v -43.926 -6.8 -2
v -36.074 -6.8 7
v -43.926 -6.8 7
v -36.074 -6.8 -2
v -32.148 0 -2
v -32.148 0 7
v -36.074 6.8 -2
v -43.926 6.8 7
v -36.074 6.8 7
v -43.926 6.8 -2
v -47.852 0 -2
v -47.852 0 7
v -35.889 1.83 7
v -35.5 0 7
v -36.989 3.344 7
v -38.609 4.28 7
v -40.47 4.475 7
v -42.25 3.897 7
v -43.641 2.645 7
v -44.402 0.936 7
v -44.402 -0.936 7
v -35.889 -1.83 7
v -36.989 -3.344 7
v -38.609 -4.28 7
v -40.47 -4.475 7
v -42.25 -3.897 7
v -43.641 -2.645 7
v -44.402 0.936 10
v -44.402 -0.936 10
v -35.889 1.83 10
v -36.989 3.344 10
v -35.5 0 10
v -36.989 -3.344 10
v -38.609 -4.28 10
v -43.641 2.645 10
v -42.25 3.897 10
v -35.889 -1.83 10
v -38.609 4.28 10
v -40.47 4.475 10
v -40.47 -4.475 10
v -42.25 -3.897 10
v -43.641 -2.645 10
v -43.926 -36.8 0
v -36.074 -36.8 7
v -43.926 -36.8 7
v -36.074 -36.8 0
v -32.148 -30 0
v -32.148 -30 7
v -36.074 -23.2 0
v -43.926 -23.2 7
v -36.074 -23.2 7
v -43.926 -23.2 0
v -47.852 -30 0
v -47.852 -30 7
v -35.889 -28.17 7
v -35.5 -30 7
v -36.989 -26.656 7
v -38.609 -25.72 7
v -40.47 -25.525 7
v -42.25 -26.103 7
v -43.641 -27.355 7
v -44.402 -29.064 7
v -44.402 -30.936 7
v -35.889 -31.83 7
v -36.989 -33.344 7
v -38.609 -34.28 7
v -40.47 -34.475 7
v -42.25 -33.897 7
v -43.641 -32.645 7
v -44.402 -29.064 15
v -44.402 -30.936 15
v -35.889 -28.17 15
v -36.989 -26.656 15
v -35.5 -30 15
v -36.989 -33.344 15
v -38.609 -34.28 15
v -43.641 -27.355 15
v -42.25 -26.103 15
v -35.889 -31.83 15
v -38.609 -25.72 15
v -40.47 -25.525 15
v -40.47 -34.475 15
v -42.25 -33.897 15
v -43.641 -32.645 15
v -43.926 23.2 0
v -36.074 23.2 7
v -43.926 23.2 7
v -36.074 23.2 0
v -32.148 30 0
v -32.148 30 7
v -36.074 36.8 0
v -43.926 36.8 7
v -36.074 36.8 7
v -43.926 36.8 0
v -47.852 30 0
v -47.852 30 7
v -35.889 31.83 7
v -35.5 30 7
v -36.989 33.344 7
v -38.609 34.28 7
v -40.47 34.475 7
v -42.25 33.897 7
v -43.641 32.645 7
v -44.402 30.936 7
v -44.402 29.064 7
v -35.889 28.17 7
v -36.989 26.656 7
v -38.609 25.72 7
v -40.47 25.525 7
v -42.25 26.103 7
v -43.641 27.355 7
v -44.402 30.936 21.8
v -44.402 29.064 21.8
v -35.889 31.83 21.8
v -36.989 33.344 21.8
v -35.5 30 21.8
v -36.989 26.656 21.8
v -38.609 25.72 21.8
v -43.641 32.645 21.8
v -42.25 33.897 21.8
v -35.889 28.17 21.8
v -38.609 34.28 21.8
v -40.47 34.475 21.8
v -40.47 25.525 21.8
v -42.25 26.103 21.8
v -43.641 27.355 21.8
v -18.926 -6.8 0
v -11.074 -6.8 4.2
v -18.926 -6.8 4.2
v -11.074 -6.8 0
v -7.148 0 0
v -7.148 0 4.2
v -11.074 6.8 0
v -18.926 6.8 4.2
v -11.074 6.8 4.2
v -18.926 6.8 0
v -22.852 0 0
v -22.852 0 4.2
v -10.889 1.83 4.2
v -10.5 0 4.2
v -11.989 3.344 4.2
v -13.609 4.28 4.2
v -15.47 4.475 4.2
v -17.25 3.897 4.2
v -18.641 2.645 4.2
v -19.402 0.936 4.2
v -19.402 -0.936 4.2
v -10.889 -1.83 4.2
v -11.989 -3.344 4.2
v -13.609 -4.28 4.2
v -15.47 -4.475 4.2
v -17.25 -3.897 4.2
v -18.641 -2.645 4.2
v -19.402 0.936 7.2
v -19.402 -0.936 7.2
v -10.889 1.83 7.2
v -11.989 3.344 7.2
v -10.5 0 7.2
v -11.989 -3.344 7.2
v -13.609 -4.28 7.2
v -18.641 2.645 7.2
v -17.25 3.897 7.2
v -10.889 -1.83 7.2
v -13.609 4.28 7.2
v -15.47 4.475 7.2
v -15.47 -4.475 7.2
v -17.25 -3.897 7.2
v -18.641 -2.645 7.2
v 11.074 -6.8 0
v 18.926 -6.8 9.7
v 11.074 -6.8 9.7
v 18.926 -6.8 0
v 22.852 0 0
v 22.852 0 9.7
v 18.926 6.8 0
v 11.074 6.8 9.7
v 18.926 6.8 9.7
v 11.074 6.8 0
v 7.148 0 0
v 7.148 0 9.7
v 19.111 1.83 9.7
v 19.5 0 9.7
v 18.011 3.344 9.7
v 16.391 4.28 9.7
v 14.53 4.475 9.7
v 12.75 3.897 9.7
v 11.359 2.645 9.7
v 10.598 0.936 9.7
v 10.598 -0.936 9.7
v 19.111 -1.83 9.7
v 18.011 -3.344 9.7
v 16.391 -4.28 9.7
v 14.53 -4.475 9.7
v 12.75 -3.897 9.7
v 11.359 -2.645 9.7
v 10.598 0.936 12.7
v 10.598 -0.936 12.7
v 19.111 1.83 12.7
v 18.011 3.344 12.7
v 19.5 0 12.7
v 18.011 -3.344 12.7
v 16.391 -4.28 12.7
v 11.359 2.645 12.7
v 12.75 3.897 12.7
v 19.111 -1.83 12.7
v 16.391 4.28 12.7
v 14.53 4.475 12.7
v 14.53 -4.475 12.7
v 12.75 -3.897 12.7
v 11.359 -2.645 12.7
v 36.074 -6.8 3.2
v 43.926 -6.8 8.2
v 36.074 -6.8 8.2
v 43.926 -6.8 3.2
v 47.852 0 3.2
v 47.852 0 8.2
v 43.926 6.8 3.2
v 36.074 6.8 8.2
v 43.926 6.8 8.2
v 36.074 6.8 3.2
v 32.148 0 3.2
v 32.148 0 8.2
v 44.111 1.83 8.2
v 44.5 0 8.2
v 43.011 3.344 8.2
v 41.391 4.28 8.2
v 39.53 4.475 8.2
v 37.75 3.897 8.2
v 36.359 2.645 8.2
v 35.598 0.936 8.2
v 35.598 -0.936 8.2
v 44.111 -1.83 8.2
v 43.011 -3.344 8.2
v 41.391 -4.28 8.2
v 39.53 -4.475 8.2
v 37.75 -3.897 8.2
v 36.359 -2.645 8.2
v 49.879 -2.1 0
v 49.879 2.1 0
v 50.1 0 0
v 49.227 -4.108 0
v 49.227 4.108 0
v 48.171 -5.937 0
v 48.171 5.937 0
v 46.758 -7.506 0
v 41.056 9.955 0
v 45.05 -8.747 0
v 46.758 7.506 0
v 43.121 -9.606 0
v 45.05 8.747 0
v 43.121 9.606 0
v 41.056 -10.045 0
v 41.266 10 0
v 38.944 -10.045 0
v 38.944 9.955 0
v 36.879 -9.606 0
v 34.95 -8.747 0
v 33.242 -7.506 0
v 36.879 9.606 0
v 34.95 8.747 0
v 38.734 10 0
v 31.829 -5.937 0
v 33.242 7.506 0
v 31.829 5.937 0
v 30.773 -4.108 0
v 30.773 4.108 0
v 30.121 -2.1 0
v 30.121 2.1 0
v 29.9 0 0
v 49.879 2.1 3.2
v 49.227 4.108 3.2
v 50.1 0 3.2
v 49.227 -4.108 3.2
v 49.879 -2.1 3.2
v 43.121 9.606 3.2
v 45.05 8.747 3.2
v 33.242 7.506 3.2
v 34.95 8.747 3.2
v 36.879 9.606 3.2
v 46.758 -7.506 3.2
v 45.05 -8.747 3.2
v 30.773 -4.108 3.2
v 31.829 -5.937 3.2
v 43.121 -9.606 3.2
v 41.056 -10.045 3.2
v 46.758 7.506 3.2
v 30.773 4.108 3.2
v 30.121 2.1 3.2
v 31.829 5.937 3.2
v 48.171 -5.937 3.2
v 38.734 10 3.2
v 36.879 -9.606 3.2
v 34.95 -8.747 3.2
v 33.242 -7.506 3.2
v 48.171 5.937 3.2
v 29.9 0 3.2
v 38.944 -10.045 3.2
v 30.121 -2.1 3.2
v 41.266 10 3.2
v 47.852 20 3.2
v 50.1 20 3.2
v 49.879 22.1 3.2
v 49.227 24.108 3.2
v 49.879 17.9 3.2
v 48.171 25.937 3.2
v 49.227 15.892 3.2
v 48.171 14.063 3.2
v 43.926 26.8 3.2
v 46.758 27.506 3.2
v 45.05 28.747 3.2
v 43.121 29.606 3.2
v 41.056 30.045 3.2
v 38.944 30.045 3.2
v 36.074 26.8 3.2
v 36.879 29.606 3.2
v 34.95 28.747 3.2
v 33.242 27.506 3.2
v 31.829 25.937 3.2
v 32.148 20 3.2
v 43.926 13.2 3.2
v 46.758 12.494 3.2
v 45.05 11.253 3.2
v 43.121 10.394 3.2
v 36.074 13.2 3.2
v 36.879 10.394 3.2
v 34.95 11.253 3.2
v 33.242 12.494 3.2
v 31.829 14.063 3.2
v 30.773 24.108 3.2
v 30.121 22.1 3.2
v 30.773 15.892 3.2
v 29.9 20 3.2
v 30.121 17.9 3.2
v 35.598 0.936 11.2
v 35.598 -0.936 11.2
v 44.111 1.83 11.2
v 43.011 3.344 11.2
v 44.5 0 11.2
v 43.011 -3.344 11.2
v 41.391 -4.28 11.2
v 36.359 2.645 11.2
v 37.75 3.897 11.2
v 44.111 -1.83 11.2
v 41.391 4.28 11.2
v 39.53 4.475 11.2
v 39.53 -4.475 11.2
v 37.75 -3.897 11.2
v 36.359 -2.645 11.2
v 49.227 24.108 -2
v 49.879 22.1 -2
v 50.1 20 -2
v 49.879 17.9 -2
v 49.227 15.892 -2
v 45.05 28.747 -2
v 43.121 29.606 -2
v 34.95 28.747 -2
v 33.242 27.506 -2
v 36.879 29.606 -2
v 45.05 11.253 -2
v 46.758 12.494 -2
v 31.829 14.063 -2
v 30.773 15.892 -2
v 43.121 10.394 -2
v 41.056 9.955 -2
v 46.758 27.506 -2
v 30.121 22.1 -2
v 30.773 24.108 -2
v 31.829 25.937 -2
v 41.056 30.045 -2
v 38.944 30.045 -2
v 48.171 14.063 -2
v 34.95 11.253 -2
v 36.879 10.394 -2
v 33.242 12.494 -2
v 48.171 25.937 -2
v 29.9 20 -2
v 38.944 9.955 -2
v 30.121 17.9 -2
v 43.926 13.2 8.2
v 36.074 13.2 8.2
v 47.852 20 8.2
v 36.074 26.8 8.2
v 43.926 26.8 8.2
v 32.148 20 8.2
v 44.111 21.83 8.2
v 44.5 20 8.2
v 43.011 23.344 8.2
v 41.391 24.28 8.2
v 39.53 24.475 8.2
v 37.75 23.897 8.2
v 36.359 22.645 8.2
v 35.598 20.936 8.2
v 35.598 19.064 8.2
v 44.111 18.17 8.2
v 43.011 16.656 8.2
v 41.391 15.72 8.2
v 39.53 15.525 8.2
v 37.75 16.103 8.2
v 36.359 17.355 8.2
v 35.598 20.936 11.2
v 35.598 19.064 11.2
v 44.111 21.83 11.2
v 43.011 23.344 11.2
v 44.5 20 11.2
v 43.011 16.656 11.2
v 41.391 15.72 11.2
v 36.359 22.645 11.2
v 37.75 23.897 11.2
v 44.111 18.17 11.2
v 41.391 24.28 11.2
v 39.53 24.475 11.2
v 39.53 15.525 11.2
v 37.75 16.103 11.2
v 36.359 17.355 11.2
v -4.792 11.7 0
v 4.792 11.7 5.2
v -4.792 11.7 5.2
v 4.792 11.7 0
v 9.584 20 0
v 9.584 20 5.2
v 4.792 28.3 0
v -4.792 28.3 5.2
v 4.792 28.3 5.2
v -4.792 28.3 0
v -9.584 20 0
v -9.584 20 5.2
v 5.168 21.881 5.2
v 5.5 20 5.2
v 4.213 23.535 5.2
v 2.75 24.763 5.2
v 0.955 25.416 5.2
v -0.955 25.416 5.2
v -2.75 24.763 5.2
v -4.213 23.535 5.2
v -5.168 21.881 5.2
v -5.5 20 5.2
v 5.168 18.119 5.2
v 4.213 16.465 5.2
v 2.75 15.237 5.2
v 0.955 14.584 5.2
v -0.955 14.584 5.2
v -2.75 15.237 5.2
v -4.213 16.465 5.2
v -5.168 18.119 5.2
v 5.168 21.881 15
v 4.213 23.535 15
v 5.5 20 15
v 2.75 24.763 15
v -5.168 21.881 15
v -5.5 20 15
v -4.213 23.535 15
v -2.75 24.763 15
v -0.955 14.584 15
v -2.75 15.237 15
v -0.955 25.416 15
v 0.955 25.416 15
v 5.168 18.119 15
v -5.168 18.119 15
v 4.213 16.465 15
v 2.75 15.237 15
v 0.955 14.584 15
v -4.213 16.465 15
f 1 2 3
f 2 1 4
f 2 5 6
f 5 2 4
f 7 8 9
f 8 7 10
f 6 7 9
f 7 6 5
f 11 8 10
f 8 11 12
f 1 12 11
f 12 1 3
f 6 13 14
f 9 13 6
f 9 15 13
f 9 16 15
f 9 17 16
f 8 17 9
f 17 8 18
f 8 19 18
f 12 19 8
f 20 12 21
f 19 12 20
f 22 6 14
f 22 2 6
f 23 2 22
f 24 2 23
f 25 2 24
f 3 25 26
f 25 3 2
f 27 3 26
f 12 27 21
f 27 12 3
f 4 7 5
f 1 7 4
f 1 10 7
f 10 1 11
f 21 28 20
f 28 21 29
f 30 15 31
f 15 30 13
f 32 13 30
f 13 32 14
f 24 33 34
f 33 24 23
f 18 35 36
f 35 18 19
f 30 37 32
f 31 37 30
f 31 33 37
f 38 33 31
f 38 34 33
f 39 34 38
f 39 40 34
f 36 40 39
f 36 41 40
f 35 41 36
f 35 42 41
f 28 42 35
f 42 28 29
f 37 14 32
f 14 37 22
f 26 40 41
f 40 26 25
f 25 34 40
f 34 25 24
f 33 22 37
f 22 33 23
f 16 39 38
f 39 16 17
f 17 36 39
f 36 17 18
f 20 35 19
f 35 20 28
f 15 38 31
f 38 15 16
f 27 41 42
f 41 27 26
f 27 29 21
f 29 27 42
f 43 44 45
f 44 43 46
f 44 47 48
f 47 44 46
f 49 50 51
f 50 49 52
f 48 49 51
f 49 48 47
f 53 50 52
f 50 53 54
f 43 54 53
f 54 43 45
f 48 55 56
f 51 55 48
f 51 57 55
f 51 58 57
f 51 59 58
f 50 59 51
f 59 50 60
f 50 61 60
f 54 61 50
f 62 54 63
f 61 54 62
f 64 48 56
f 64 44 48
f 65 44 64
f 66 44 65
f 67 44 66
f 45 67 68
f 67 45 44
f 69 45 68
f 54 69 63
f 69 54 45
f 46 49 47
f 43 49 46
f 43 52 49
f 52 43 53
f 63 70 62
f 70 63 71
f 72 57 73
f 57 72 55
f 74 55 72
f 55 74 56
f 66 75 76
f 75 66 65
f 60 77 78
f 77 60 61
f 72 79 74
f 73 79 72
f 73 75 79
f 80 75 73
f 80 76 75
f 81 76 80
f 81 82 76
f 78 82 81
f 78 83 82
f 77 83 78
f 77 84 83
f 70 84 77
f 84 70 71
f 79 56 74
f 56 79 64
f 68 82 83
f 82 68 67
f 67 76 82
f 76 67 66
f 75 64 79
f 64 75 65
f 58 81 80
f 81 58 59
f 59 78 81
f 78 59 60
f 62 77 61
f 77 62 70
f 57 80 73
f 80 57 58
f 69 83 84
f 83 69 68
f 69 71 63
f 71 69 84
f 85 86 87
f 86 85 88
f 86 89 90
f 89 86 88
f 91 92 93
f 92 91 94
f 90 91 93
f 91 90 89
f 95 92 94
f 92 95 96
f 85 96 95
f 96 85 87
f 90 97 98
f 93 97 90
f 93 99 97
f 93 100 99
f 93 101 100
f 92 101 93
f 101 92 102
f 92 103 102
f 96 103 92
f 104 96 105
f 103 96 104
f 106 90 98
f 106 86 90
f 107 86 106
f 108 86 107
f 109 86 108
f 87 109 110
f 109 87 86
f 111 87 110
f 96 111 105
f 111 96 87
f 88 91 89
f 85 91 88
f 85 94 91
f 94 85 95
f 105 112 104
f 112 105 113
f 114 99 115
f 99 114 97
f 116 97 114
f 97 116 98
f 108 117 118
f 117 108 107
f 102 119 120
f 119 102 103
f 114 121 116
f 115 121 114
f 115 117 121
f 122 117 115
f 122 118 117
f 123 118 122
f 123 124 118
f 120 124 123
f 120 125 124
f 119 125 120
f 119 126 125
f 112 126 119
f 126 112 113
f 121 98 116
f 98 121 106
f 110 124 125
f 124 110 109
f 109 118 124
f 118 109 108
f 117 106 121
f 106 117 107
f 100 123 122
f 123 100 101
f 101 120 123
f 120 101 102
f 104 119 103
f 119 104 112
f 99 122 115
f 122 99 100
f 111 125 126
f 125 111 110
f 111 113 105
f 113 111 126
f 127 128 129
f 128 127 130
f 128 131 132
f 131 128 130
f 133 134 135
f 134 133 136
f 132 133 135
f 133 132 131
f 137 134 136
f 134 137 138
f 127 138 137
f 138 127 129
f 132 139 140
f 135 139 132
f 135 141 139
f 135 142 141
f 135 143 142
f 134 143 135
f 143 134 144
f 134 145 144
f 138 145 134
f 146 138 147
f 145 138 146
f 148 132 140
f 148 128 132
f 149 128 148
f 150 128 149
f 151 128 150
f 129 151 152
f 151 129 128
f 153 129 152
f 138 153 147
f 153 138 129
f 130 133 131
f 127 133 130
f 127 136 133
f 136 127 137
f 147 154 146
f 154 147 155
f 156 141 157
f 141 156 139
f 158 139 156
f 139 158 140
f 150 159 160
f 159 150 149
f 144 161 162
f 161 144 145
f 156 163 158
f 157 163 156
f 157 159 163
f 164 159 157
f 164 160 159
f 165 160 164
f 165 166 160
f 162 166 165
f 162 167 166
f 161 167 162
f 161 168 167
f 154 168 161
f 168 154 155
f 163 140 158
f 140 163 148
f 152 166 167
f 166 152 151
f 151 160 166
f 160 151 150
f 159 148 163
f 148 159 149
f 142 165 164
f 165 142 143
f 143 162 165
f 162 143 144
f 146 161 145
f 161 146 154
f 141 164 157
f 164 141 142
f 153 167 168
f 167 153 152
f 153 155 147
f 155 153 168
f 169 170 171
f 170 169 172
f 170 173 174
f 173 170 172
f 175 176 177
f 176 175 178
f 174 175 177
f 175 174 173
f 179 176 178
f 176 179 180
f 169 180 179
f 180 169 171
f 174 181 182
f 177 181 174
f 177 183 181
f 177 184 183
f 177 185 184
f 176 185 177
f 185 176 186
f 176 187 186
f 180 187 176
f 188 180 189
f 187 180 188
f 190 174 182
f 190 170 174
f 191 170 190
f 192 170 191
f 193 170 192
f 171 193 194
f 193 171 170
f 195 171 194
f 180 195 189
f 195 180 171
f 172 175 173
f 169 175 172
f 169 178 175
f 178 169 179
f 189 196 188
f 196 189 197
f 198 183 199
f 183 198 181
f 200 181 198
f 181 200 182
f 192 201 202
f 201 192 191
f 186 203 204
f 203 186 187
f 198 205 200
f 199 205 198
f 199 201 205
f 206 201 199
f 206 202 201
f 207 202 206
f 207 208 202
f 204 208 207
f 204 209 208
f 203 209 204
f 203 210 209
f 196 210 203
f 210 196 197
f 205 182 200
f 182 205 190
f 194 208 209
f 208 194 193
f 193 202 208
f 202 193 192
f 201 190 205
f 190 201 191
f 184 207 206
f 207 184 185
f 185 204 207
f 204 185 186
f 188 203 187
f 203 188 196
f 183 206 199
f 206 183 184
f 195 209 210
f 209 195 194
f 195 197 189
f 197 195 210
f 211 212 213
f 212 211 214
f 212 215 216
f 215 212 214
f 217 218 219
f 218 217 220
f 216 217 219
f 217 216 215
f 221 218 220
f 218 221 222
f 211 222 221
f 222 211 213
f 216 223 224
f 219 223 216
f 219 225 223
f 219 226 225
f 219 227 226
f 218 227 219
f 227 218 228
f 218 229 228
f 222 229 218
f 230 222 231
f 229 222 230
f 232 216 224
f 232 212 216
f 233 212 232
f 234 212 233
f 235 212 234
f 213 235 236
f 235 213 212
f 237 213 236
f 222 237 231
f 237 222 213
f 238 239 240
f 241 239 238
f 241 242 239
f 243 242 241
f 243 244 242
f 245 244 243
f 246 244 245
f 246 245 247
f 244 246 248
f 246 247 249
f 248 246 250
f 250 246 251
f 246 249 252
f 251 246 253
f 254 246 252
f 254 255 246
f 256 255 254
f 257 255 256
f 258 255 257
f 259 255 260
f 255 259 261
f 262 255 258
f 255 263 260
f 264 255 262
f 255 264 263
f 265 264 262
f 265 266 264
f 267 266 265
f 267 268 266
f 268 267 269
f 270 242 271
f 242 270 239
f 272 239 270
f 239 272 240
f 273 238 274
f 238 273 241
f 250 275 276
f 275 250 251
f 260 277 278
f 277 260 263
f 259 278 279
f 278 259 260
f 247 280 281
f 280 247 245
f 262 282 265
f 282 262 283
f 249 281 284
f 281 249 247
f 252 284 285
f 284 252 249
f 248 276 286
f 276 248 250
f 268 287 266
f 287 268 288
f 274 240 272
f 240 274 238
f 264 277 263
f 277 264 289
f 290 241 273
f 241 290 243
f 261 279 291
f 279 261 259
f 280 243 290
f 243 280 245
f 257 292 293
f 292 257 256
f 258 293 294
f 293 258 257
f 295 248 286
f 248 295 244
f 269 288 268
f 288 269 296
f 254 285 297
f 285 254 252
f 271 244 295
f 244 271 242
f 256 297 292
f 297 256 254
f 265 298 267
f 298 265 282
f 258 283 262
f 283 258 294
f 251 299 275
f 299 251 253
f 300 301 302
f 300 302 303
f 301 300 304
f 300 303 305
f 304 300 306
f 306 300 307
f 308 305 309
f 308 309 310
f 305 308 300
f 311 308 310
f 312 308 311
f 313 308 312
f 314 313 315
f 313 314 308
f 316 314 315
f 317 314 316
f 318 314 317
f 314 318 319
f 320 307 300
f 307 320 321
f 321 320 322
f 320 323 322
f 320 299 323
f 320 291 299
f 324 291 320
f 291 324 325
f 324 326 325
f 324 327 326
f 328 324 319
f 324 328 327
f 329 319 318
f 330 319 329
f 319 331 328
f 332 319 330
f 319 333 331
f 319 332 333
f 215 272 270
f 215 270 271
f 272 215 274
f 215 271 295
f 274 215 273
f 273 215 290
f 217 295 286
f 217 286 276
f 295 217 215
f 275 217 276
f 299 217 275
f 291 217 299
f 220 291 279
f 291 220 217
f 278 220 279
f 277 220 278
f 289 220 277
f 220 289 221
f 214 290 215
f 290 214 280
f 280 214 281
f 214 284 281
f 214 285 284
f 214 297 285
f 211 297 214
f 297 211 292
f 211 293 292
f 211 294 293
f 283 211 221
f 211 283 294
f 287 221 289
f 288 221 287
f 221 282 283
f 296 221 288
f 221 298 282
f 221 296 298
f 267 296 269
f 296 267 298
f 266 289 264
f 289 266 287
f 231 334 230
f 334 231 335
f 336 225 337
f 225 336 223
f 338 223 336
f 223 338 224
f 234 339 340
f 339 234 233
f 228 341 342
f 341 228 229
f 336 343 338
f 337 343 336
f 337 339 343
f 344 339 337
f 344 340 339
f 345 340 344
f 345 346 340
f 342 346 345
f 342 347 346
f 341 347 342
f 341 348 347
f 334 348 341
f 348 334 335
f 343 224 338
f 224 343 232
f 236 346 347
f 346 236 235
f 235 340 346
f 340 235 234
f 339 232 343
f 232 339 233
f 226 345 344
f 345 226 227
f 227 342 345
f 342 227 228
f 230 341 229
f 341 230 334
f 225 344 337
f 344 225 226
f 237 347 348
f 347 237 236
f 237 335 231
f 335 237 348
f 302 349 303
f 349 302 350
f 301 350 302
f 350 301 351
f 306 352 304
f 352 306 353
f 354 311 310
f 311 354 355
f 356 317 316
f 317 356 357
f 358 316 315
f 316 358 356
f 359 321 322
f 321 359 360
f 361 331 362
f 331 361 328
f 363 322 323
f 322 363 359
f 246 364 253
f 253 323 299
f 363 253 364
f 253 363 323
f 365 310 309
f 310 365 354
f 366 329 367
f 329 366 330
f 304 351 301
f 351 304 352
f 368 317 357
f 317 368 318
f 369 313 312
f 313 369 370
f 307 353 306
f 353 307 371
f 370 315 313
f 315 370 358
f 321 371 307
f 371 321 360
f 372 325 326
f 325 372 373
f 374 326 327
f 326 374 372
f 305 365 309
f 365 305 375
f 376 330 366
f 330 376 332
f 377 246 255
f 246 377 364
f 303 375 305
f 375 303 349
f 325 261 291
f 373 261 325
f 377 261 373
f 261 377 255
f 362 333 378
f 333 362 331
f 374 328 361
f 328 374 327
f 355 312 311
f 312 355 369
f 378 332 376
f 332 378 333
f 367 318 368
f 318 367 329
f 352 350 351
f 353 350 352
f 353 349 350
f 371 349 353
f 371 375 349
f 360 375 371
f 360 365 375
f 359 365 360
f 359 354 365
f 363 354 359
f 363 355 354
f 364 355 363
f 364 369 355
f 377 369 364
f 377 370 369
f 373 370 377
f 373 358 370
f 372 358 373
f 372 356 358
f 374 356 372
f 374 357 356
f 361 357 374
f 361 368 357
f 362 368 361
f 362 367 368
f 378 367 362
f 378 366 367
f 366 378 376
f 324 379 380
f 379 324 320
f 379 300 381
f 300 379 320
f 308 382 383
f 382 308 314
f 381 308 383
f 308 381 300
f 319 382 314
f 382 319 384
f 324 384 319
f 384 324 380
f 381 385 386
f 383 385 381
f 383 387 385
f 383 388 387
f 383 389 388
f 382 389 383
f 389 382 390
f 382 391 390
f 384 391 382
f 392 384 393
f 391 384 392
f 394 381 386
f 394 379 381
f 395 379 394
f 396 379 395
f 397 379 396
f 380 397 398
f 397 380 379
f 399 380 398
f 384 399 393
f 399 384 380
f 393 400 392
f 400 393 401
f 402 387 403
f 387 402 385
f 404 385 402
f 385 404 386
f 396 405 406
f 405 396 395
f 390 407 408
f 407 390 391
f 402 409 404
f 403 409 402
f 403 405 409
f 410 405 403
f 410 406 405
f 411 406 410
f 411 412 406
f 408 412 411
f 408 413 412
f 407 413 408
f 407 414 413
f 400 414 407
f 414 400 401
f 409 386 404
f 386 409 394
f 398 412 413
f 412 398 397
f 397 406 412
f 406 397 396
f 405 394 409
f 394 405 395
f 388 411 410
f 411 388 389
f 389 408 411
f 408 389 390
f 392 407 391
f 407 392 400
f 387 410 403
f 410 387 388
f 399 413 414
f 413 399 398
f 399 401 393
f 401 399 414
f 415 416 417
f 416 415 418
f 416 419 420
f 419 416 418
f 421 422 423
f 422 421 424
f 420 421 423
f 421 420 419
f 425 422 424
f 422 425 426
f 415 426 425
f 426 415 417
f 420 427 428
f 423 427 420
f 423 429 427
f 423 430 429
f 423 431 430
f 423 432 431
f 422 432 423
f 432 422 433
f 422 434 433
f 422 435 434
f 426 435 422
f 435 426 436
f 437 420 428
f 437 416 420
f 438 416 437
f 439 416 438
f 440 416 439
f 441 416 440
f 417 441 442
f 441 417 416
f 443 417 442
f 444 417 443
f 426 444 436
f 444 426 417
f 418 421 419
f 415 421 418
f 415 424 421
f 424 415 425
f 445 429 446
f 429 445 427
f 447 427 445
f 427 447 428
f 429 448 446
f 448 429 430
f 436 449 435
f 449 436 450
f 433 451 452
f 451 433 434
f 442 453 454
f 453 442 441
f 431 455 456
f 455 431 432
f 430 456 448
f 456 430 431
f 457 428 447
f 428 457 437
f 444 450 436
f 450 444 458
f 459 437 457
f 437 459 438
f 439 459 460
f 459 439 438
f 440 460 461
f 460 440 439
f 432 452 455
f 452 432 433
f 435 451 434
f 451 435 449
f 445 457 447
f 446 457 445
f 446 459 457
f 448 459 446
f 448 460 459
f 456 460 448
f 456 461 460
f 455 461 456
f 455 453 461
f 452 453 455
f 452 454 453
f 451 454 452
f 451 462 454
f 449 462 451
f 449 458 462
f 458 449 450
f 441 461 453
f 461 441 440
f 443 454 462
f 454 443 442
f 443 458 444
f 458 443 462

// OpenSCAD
// =====================================================
// CALCULADORA - TUERCAS MÉTRICAS (varios tipos)
// DIN 934 (normal) / DIN 936 (delgada) /
// DIN 985 (autoblocante nylon) / DIN 6923 (con brida)
// El diámetro de rosca se ingresa en MILÍMETROS (M)
// =====================================================

// -----------------------------------------------------
// DIN 934 / ISO 4032 - Tuerca hexagonal NORMAL
// [ancho_entre_caras, espesor]
// -----------------------------------------------------
function tuerca_din934(D) =
    D <= 3  ? [5.5,  2.4]  :
    D <= 4  ? [7.0,  3.2]  :
    D <= 5  ? [8.0,  4.7]  :
    D <= 6  ? [10.0, 5.2]  :
    D <= 8  ? [13.0, 6.8]  :
    D <= 10 ? [16.0, 8.4]  :
    D <= 12 ? [18.0, 10.8] :
    D <= 14 ? [21.0, 12.8] :
    D <= 16 ? [24.0, 14.8] :
    D <= 18 ? [27.0, 15.8] :
    D <= 20 ? [30.0, 18.0] :
    D <= 24 ? [36.0, 21.5] :
    [D * 1.6, D * 0.9]; // fórmula general

// -----------------------------------------------------
// DIN 936 / ISO 4035 - Tuerca hexagonal DELGADA
// -----------------------------------------------------
function tuerca_din936(D) =
    D <= 3  ? [5.5,  1.8] :
    D <= 4  ? [7.0,  2.2] :
    D <= 5  ? [8.0,  2.7] :
    D <= 6  ? [10.0, 3.2] :
    D <= 8  ? [13.0, 4.0] :
    D <= 10 ? [16.0, 5.0] :
    D <= 12 ? [18.0, 6.0] :
    D <= 14 ? [21.0, 7.0] :
    D <= 16 ? [24.0, 8.0] :
    D <= 18 ? [27.0, 9.0] :
    D <= 20 ? [30.0, 10.0] :
    D <= 24 ? [36.0, 12.0] :
    [D * 1.6, D * 0.5]; // fórmula general

// -----------------------------------------------------
// DIN 985 / ISO 10511 - Tuerca AUTOBLOCANTE (nylon)
// Valores de REFERENCIA (varían según fabricante)
// -----------------------------------------------------
function tuerca_din985(D) =
    D <= 3  ? [5.5,  4.0]  :
    D <= 4  ? [7.0,  5.0]  :
    D <= 5  ? [8.0,  5.7]  :
    D <= 6  ? [10.0, 7.5]  :
    D <= 8  ? [13.0, 9.5]  :
    D <= 10 ? [16.0, 11.4] :
    D <= 12 ? [18.0, 13.9] :
    D <= 14 ? [21.0, 16.0] :
    D <= 16 ? [24.0, 16.4] :
    D <= 18 ? [27.0, 18.5] :
    D <= 20 ? [30.0, 19.5] :
    [D * 1.6, D * 1.4]; // fórmula general aproximada

// -----------------------------------------------------
// DIN 6923 - Tuerca hexagonal CON BRIDA
// [ancho_entre_caras, espesor, diametro_brida]
// -----------------------------------------------------
function tuerca_din6923(D) =
    D <= 4  ? [7.0,  5.0,  9.8]  :
    D <= 5  ? [8.0,  5.0,  11.8] :
    D <= 6  ? [10.0, 6.0,  15.8] :
    D <= 8  ? [13.0, 8.0,  19.6] :
    D <= 10 ? [16.0, 10.0, 23.8] :
    D <= 12 ? [18.0, 12.0, 27.6] :
    D <= 14 ? [21.0, 14.0, 31.4] :
    D <= 16 ? [24.0, 16.0, 34.5] :
    [D * 1.6, D * 1.0, D * 3.0]; // fórmula general

// -----------------------------------------------------
// FUNCIÓN SELECTORA GENERAL
// Devuelve siempre [ancho_caras, espesor, diametro_brida]
// (diametro_brida = 0 si el tipo no tiene brida)
// -----------------------------------------------------
function tuerca_metrica(D, tipo = "normal") =
    tipo == "normal"       ? [tuerca_din934(D)[0],  tuerca_din934(D)[1],  0] :
    tipo == "delgada"      ? [tuerca_din936(D)[0],  tuerca_din936(D)[1],  0] :
    tipo == "autoblocante" ? [tuerca_din985(D)[0],  tuerca_din985(D)[1],  0] :
    tipo == "brida"        ? tuerca_din6923(D) :
    tuerca_din934(D); // por defecto, normal

// =====================================================
// MÓDULO: BOLSILLO HEXAGONAL PARA TUERCA MÉTRICA
// profundidad_bolsillo ahora es OPCIONAL:
// si no se pasa (queda -1), se usa el espesor estándar (m)
// =====================================================
module bolsillo_tuerca_metrica(
    diametro_rosca,             // Diámetro nominal en mm (ej: 8 para M8)
    tipo = "normal",             // "normal" | "delgada" | "autoblocante" | "brida"
    profundidad_bolsillo = -1,   // -1 = usar altura estándar según norma
    holgura = 0.3,
    holgura_altura = 0.2,
    alivio=0 // hueco hacia atras para introducir la tuerca -- buscar mejor nombre
) {
    datos = tuerca_metrica(diametro_rosca, tipo);
    ancho_caras = datos[0];
    espesor_estandar = datos[1];

    // Si no se especificó, usar el valor estándar de la norma
    profundidad_real = profundidad_bolsillo < 0 ? espesor_estandar : profundidad_bolsillo;

    radio_hex = (ancho_caras/2 + holgura) / cos(30);

    translate([0, 0, 0])
        cylinder(h = profundidad_real + holgura_altura,
                 r = radio_hex,
                 $fn = 6);

    if (tipo == "brida" && datos[2] > 0) {
        translate([0, 0, 0])
            cylinder(h = profundidad_real * 0.4,
                     r = (datos[2]/2) + holgura);
        if(alivio>0){
        translate([ 0, 0,-alivio])
         color("#AA00AAAA")cylinder(h = alivio ,
                     r = (datos[2]/2) + holgura);
         }
     }else if(alivio>0){
     translate([ 0, 0,-alivio])

      color("#AA00AAAA")cylinder(h=alivio,r=radio_hex,$fn = 6);
     }
    
    
    
}

// =====================================================
// MÓDULO: AGUJERO PASANTE PARA EL VÁSTAGO
// =====================================================
module agujero_pasante_tuerca_metrica(
    diametro_rosca,
    profundidad,
    profundidad_bolsillo = 0,
    holgura = 0.5,
    profundidad_abs = true
) {
    if (profundidad_abs)
        translate([0, 0, profundidad_bolsillo])
            cylinder(h = profundidad - profundidad_bolsillo,
                     r = (diametro_rosca/2) + holgura);
    else
        translate([0, 0, profundidad_bolsillo])
            cylinder(h = profundidad,
                     r = (diametro_rosca/2) + holgura);
}

// =====================================================
// MÓDULO COMBINADO: TUERCA EMBUTIDA + AGUJERO PASANTE
// profundidad_bolsillo y profundidad_pieza ahora son
// OPCIONALES: si no se pasan, se calculan según la norma
// =====================================================
module agujero_con_tuerca_metrica(
    diametro_rosca,
    tipo = "normal",              // Tipo de tuerca
    profundidad_bolsillo = -1,    // -1 = usar altura estándar (m) de la norma
    profundidad_pieza = -1,       // -1 = calcular automáticamente (bolsillo + margen)
    margen_pieza = 3,              // mm extra de material debajo de la tuerca (si se autocalcula)
    holgura_tuerca = 0.3,
    holgura_pasante = 0.5,
    holgura_altura = 0.2,
    profundidad_abs = true,
    alivio=0
) {
    datos = tuerca_metrica(diametro_rosca, tipo);
    espesor_estandar = datos[1];

    // Resolver profundidad del bolsillo (default = altura estándar de norma)
    bolsillo_real = profundidad_bolsillo < 0 ? espesor_estandar : profundidad_bolsillo;

    // Resolver profundidad de la pieza (default = bolsillo + margen)
    pieza_real = profundidad_pieza < 0 ? (bolsillo_real + holgura_altura + margen_pieza) : profundidad_pieza;

    bolsillo_tuerca_metrica(
        diametro_rosca = diametro_rosca,
        tipo = tipo,
        profundidad_bolsillo = bolsillo_real,
        holgura = holgura_tuerca,
        holgura_altura = holgura_altura,
        alivio=alivio
    );

    agujero_pasante_tuerca_metrica(
        diametro_rosca = diametro_rosca,
        profundidad = pieza_real,
        profundidad_bolsillo = bolsillo_real,
        holgura = holgura_pasante,
        profundidad_abs = profundidad_abs
    );
}

// Utilidades
function ancho_caras_tuerca_metrica(D, tipo = "normal") = tuerca_metrica(D, tipo)[0];
function espesor_tuerca_metrica(D, tipo = "normal") = tuerca_metrica(D, tipo)[1];
function brida_tuerca_metrica(D, tipo = "brida") = tuerca_metrica(D, tipo)[2];

// =====================================================
// EJEMPLOS - ahora con defaults automáticos
// (no hace falta pasar profundidad_bolsillo ni profundidad_pieza)
// =====================================================

// M8 normal (DIN 934): usa m=6.8mm automáticamente
echo("M8 normal:", tuerca_metrica(8, "normal"));

translate([-40, 0, 0]){
     agujero_con_tuerca_metrica(8, tipo="normal", alivio=2);
//
//  sagita=2;
// holgura_tuerca=1.1;
//    agujero_con_tuerca_metrica(8, tipo="normal");
// translate([ 0, 0,-sagita])
//
//      color("#AA0000")cylinder(h=sagita,r=tuerca_metrica(8, "normal")[1]+holgura_tuerca,$fn = 6);
}


translate([-40, -30, 0])
    agujero_con_tuerca_metrica(8,profundidad_pieza = 15, tipo="normal");
translate([-40, 30, 0])
    agujero_con_tuerca_metrica(8,profundidad_pieza = 15, tipo="normal",     profundidad_abs = false);

// M8 delgada (DIN 936): usa m=4.0mm automáticamente
echo("M8 delgada:", tuerca_metrica(8, "delgada"));
translate([-15, 0, 0])
    agujero_con_tuerca_metrica(8, tipo="delgada");

// M8 autoblocante (DIN 985): usa m=9.5mm automáticamente
echo("M8 autoblocante:", tuerca_metrica(8, "autoblocante"));
translate([15, 0, 0])
    agujero_con_tuerca_metrica(8, tipo="autoblocante");

// M8 con brida (DIN 6923): usa m=8.0mm automáticamente
echo("M8 con brida:", tuerca_metrica(8, "brida"));
translate([40, 0, 0])
    agujero_con_tuerca_metrica(8, tipo="brida");
// M8 con brida (DIN 6923): usa m=8.0mm automáticamente
echo("M8 con brida:", tuerca_metrica(8, "brida"));
translate([40, 20, 0])
    agujero_con_tuerca_metrica(8, tipo="brida", alivio =2);

// Si igual querés forzar un valor custom, lo podés seguir pasando:
translate([0, 20, 0])
    agujero_con_tuerca_metrica(10, tipo="normal", profundidad_bolsillo = 5, profundidad_pieza = 15);
